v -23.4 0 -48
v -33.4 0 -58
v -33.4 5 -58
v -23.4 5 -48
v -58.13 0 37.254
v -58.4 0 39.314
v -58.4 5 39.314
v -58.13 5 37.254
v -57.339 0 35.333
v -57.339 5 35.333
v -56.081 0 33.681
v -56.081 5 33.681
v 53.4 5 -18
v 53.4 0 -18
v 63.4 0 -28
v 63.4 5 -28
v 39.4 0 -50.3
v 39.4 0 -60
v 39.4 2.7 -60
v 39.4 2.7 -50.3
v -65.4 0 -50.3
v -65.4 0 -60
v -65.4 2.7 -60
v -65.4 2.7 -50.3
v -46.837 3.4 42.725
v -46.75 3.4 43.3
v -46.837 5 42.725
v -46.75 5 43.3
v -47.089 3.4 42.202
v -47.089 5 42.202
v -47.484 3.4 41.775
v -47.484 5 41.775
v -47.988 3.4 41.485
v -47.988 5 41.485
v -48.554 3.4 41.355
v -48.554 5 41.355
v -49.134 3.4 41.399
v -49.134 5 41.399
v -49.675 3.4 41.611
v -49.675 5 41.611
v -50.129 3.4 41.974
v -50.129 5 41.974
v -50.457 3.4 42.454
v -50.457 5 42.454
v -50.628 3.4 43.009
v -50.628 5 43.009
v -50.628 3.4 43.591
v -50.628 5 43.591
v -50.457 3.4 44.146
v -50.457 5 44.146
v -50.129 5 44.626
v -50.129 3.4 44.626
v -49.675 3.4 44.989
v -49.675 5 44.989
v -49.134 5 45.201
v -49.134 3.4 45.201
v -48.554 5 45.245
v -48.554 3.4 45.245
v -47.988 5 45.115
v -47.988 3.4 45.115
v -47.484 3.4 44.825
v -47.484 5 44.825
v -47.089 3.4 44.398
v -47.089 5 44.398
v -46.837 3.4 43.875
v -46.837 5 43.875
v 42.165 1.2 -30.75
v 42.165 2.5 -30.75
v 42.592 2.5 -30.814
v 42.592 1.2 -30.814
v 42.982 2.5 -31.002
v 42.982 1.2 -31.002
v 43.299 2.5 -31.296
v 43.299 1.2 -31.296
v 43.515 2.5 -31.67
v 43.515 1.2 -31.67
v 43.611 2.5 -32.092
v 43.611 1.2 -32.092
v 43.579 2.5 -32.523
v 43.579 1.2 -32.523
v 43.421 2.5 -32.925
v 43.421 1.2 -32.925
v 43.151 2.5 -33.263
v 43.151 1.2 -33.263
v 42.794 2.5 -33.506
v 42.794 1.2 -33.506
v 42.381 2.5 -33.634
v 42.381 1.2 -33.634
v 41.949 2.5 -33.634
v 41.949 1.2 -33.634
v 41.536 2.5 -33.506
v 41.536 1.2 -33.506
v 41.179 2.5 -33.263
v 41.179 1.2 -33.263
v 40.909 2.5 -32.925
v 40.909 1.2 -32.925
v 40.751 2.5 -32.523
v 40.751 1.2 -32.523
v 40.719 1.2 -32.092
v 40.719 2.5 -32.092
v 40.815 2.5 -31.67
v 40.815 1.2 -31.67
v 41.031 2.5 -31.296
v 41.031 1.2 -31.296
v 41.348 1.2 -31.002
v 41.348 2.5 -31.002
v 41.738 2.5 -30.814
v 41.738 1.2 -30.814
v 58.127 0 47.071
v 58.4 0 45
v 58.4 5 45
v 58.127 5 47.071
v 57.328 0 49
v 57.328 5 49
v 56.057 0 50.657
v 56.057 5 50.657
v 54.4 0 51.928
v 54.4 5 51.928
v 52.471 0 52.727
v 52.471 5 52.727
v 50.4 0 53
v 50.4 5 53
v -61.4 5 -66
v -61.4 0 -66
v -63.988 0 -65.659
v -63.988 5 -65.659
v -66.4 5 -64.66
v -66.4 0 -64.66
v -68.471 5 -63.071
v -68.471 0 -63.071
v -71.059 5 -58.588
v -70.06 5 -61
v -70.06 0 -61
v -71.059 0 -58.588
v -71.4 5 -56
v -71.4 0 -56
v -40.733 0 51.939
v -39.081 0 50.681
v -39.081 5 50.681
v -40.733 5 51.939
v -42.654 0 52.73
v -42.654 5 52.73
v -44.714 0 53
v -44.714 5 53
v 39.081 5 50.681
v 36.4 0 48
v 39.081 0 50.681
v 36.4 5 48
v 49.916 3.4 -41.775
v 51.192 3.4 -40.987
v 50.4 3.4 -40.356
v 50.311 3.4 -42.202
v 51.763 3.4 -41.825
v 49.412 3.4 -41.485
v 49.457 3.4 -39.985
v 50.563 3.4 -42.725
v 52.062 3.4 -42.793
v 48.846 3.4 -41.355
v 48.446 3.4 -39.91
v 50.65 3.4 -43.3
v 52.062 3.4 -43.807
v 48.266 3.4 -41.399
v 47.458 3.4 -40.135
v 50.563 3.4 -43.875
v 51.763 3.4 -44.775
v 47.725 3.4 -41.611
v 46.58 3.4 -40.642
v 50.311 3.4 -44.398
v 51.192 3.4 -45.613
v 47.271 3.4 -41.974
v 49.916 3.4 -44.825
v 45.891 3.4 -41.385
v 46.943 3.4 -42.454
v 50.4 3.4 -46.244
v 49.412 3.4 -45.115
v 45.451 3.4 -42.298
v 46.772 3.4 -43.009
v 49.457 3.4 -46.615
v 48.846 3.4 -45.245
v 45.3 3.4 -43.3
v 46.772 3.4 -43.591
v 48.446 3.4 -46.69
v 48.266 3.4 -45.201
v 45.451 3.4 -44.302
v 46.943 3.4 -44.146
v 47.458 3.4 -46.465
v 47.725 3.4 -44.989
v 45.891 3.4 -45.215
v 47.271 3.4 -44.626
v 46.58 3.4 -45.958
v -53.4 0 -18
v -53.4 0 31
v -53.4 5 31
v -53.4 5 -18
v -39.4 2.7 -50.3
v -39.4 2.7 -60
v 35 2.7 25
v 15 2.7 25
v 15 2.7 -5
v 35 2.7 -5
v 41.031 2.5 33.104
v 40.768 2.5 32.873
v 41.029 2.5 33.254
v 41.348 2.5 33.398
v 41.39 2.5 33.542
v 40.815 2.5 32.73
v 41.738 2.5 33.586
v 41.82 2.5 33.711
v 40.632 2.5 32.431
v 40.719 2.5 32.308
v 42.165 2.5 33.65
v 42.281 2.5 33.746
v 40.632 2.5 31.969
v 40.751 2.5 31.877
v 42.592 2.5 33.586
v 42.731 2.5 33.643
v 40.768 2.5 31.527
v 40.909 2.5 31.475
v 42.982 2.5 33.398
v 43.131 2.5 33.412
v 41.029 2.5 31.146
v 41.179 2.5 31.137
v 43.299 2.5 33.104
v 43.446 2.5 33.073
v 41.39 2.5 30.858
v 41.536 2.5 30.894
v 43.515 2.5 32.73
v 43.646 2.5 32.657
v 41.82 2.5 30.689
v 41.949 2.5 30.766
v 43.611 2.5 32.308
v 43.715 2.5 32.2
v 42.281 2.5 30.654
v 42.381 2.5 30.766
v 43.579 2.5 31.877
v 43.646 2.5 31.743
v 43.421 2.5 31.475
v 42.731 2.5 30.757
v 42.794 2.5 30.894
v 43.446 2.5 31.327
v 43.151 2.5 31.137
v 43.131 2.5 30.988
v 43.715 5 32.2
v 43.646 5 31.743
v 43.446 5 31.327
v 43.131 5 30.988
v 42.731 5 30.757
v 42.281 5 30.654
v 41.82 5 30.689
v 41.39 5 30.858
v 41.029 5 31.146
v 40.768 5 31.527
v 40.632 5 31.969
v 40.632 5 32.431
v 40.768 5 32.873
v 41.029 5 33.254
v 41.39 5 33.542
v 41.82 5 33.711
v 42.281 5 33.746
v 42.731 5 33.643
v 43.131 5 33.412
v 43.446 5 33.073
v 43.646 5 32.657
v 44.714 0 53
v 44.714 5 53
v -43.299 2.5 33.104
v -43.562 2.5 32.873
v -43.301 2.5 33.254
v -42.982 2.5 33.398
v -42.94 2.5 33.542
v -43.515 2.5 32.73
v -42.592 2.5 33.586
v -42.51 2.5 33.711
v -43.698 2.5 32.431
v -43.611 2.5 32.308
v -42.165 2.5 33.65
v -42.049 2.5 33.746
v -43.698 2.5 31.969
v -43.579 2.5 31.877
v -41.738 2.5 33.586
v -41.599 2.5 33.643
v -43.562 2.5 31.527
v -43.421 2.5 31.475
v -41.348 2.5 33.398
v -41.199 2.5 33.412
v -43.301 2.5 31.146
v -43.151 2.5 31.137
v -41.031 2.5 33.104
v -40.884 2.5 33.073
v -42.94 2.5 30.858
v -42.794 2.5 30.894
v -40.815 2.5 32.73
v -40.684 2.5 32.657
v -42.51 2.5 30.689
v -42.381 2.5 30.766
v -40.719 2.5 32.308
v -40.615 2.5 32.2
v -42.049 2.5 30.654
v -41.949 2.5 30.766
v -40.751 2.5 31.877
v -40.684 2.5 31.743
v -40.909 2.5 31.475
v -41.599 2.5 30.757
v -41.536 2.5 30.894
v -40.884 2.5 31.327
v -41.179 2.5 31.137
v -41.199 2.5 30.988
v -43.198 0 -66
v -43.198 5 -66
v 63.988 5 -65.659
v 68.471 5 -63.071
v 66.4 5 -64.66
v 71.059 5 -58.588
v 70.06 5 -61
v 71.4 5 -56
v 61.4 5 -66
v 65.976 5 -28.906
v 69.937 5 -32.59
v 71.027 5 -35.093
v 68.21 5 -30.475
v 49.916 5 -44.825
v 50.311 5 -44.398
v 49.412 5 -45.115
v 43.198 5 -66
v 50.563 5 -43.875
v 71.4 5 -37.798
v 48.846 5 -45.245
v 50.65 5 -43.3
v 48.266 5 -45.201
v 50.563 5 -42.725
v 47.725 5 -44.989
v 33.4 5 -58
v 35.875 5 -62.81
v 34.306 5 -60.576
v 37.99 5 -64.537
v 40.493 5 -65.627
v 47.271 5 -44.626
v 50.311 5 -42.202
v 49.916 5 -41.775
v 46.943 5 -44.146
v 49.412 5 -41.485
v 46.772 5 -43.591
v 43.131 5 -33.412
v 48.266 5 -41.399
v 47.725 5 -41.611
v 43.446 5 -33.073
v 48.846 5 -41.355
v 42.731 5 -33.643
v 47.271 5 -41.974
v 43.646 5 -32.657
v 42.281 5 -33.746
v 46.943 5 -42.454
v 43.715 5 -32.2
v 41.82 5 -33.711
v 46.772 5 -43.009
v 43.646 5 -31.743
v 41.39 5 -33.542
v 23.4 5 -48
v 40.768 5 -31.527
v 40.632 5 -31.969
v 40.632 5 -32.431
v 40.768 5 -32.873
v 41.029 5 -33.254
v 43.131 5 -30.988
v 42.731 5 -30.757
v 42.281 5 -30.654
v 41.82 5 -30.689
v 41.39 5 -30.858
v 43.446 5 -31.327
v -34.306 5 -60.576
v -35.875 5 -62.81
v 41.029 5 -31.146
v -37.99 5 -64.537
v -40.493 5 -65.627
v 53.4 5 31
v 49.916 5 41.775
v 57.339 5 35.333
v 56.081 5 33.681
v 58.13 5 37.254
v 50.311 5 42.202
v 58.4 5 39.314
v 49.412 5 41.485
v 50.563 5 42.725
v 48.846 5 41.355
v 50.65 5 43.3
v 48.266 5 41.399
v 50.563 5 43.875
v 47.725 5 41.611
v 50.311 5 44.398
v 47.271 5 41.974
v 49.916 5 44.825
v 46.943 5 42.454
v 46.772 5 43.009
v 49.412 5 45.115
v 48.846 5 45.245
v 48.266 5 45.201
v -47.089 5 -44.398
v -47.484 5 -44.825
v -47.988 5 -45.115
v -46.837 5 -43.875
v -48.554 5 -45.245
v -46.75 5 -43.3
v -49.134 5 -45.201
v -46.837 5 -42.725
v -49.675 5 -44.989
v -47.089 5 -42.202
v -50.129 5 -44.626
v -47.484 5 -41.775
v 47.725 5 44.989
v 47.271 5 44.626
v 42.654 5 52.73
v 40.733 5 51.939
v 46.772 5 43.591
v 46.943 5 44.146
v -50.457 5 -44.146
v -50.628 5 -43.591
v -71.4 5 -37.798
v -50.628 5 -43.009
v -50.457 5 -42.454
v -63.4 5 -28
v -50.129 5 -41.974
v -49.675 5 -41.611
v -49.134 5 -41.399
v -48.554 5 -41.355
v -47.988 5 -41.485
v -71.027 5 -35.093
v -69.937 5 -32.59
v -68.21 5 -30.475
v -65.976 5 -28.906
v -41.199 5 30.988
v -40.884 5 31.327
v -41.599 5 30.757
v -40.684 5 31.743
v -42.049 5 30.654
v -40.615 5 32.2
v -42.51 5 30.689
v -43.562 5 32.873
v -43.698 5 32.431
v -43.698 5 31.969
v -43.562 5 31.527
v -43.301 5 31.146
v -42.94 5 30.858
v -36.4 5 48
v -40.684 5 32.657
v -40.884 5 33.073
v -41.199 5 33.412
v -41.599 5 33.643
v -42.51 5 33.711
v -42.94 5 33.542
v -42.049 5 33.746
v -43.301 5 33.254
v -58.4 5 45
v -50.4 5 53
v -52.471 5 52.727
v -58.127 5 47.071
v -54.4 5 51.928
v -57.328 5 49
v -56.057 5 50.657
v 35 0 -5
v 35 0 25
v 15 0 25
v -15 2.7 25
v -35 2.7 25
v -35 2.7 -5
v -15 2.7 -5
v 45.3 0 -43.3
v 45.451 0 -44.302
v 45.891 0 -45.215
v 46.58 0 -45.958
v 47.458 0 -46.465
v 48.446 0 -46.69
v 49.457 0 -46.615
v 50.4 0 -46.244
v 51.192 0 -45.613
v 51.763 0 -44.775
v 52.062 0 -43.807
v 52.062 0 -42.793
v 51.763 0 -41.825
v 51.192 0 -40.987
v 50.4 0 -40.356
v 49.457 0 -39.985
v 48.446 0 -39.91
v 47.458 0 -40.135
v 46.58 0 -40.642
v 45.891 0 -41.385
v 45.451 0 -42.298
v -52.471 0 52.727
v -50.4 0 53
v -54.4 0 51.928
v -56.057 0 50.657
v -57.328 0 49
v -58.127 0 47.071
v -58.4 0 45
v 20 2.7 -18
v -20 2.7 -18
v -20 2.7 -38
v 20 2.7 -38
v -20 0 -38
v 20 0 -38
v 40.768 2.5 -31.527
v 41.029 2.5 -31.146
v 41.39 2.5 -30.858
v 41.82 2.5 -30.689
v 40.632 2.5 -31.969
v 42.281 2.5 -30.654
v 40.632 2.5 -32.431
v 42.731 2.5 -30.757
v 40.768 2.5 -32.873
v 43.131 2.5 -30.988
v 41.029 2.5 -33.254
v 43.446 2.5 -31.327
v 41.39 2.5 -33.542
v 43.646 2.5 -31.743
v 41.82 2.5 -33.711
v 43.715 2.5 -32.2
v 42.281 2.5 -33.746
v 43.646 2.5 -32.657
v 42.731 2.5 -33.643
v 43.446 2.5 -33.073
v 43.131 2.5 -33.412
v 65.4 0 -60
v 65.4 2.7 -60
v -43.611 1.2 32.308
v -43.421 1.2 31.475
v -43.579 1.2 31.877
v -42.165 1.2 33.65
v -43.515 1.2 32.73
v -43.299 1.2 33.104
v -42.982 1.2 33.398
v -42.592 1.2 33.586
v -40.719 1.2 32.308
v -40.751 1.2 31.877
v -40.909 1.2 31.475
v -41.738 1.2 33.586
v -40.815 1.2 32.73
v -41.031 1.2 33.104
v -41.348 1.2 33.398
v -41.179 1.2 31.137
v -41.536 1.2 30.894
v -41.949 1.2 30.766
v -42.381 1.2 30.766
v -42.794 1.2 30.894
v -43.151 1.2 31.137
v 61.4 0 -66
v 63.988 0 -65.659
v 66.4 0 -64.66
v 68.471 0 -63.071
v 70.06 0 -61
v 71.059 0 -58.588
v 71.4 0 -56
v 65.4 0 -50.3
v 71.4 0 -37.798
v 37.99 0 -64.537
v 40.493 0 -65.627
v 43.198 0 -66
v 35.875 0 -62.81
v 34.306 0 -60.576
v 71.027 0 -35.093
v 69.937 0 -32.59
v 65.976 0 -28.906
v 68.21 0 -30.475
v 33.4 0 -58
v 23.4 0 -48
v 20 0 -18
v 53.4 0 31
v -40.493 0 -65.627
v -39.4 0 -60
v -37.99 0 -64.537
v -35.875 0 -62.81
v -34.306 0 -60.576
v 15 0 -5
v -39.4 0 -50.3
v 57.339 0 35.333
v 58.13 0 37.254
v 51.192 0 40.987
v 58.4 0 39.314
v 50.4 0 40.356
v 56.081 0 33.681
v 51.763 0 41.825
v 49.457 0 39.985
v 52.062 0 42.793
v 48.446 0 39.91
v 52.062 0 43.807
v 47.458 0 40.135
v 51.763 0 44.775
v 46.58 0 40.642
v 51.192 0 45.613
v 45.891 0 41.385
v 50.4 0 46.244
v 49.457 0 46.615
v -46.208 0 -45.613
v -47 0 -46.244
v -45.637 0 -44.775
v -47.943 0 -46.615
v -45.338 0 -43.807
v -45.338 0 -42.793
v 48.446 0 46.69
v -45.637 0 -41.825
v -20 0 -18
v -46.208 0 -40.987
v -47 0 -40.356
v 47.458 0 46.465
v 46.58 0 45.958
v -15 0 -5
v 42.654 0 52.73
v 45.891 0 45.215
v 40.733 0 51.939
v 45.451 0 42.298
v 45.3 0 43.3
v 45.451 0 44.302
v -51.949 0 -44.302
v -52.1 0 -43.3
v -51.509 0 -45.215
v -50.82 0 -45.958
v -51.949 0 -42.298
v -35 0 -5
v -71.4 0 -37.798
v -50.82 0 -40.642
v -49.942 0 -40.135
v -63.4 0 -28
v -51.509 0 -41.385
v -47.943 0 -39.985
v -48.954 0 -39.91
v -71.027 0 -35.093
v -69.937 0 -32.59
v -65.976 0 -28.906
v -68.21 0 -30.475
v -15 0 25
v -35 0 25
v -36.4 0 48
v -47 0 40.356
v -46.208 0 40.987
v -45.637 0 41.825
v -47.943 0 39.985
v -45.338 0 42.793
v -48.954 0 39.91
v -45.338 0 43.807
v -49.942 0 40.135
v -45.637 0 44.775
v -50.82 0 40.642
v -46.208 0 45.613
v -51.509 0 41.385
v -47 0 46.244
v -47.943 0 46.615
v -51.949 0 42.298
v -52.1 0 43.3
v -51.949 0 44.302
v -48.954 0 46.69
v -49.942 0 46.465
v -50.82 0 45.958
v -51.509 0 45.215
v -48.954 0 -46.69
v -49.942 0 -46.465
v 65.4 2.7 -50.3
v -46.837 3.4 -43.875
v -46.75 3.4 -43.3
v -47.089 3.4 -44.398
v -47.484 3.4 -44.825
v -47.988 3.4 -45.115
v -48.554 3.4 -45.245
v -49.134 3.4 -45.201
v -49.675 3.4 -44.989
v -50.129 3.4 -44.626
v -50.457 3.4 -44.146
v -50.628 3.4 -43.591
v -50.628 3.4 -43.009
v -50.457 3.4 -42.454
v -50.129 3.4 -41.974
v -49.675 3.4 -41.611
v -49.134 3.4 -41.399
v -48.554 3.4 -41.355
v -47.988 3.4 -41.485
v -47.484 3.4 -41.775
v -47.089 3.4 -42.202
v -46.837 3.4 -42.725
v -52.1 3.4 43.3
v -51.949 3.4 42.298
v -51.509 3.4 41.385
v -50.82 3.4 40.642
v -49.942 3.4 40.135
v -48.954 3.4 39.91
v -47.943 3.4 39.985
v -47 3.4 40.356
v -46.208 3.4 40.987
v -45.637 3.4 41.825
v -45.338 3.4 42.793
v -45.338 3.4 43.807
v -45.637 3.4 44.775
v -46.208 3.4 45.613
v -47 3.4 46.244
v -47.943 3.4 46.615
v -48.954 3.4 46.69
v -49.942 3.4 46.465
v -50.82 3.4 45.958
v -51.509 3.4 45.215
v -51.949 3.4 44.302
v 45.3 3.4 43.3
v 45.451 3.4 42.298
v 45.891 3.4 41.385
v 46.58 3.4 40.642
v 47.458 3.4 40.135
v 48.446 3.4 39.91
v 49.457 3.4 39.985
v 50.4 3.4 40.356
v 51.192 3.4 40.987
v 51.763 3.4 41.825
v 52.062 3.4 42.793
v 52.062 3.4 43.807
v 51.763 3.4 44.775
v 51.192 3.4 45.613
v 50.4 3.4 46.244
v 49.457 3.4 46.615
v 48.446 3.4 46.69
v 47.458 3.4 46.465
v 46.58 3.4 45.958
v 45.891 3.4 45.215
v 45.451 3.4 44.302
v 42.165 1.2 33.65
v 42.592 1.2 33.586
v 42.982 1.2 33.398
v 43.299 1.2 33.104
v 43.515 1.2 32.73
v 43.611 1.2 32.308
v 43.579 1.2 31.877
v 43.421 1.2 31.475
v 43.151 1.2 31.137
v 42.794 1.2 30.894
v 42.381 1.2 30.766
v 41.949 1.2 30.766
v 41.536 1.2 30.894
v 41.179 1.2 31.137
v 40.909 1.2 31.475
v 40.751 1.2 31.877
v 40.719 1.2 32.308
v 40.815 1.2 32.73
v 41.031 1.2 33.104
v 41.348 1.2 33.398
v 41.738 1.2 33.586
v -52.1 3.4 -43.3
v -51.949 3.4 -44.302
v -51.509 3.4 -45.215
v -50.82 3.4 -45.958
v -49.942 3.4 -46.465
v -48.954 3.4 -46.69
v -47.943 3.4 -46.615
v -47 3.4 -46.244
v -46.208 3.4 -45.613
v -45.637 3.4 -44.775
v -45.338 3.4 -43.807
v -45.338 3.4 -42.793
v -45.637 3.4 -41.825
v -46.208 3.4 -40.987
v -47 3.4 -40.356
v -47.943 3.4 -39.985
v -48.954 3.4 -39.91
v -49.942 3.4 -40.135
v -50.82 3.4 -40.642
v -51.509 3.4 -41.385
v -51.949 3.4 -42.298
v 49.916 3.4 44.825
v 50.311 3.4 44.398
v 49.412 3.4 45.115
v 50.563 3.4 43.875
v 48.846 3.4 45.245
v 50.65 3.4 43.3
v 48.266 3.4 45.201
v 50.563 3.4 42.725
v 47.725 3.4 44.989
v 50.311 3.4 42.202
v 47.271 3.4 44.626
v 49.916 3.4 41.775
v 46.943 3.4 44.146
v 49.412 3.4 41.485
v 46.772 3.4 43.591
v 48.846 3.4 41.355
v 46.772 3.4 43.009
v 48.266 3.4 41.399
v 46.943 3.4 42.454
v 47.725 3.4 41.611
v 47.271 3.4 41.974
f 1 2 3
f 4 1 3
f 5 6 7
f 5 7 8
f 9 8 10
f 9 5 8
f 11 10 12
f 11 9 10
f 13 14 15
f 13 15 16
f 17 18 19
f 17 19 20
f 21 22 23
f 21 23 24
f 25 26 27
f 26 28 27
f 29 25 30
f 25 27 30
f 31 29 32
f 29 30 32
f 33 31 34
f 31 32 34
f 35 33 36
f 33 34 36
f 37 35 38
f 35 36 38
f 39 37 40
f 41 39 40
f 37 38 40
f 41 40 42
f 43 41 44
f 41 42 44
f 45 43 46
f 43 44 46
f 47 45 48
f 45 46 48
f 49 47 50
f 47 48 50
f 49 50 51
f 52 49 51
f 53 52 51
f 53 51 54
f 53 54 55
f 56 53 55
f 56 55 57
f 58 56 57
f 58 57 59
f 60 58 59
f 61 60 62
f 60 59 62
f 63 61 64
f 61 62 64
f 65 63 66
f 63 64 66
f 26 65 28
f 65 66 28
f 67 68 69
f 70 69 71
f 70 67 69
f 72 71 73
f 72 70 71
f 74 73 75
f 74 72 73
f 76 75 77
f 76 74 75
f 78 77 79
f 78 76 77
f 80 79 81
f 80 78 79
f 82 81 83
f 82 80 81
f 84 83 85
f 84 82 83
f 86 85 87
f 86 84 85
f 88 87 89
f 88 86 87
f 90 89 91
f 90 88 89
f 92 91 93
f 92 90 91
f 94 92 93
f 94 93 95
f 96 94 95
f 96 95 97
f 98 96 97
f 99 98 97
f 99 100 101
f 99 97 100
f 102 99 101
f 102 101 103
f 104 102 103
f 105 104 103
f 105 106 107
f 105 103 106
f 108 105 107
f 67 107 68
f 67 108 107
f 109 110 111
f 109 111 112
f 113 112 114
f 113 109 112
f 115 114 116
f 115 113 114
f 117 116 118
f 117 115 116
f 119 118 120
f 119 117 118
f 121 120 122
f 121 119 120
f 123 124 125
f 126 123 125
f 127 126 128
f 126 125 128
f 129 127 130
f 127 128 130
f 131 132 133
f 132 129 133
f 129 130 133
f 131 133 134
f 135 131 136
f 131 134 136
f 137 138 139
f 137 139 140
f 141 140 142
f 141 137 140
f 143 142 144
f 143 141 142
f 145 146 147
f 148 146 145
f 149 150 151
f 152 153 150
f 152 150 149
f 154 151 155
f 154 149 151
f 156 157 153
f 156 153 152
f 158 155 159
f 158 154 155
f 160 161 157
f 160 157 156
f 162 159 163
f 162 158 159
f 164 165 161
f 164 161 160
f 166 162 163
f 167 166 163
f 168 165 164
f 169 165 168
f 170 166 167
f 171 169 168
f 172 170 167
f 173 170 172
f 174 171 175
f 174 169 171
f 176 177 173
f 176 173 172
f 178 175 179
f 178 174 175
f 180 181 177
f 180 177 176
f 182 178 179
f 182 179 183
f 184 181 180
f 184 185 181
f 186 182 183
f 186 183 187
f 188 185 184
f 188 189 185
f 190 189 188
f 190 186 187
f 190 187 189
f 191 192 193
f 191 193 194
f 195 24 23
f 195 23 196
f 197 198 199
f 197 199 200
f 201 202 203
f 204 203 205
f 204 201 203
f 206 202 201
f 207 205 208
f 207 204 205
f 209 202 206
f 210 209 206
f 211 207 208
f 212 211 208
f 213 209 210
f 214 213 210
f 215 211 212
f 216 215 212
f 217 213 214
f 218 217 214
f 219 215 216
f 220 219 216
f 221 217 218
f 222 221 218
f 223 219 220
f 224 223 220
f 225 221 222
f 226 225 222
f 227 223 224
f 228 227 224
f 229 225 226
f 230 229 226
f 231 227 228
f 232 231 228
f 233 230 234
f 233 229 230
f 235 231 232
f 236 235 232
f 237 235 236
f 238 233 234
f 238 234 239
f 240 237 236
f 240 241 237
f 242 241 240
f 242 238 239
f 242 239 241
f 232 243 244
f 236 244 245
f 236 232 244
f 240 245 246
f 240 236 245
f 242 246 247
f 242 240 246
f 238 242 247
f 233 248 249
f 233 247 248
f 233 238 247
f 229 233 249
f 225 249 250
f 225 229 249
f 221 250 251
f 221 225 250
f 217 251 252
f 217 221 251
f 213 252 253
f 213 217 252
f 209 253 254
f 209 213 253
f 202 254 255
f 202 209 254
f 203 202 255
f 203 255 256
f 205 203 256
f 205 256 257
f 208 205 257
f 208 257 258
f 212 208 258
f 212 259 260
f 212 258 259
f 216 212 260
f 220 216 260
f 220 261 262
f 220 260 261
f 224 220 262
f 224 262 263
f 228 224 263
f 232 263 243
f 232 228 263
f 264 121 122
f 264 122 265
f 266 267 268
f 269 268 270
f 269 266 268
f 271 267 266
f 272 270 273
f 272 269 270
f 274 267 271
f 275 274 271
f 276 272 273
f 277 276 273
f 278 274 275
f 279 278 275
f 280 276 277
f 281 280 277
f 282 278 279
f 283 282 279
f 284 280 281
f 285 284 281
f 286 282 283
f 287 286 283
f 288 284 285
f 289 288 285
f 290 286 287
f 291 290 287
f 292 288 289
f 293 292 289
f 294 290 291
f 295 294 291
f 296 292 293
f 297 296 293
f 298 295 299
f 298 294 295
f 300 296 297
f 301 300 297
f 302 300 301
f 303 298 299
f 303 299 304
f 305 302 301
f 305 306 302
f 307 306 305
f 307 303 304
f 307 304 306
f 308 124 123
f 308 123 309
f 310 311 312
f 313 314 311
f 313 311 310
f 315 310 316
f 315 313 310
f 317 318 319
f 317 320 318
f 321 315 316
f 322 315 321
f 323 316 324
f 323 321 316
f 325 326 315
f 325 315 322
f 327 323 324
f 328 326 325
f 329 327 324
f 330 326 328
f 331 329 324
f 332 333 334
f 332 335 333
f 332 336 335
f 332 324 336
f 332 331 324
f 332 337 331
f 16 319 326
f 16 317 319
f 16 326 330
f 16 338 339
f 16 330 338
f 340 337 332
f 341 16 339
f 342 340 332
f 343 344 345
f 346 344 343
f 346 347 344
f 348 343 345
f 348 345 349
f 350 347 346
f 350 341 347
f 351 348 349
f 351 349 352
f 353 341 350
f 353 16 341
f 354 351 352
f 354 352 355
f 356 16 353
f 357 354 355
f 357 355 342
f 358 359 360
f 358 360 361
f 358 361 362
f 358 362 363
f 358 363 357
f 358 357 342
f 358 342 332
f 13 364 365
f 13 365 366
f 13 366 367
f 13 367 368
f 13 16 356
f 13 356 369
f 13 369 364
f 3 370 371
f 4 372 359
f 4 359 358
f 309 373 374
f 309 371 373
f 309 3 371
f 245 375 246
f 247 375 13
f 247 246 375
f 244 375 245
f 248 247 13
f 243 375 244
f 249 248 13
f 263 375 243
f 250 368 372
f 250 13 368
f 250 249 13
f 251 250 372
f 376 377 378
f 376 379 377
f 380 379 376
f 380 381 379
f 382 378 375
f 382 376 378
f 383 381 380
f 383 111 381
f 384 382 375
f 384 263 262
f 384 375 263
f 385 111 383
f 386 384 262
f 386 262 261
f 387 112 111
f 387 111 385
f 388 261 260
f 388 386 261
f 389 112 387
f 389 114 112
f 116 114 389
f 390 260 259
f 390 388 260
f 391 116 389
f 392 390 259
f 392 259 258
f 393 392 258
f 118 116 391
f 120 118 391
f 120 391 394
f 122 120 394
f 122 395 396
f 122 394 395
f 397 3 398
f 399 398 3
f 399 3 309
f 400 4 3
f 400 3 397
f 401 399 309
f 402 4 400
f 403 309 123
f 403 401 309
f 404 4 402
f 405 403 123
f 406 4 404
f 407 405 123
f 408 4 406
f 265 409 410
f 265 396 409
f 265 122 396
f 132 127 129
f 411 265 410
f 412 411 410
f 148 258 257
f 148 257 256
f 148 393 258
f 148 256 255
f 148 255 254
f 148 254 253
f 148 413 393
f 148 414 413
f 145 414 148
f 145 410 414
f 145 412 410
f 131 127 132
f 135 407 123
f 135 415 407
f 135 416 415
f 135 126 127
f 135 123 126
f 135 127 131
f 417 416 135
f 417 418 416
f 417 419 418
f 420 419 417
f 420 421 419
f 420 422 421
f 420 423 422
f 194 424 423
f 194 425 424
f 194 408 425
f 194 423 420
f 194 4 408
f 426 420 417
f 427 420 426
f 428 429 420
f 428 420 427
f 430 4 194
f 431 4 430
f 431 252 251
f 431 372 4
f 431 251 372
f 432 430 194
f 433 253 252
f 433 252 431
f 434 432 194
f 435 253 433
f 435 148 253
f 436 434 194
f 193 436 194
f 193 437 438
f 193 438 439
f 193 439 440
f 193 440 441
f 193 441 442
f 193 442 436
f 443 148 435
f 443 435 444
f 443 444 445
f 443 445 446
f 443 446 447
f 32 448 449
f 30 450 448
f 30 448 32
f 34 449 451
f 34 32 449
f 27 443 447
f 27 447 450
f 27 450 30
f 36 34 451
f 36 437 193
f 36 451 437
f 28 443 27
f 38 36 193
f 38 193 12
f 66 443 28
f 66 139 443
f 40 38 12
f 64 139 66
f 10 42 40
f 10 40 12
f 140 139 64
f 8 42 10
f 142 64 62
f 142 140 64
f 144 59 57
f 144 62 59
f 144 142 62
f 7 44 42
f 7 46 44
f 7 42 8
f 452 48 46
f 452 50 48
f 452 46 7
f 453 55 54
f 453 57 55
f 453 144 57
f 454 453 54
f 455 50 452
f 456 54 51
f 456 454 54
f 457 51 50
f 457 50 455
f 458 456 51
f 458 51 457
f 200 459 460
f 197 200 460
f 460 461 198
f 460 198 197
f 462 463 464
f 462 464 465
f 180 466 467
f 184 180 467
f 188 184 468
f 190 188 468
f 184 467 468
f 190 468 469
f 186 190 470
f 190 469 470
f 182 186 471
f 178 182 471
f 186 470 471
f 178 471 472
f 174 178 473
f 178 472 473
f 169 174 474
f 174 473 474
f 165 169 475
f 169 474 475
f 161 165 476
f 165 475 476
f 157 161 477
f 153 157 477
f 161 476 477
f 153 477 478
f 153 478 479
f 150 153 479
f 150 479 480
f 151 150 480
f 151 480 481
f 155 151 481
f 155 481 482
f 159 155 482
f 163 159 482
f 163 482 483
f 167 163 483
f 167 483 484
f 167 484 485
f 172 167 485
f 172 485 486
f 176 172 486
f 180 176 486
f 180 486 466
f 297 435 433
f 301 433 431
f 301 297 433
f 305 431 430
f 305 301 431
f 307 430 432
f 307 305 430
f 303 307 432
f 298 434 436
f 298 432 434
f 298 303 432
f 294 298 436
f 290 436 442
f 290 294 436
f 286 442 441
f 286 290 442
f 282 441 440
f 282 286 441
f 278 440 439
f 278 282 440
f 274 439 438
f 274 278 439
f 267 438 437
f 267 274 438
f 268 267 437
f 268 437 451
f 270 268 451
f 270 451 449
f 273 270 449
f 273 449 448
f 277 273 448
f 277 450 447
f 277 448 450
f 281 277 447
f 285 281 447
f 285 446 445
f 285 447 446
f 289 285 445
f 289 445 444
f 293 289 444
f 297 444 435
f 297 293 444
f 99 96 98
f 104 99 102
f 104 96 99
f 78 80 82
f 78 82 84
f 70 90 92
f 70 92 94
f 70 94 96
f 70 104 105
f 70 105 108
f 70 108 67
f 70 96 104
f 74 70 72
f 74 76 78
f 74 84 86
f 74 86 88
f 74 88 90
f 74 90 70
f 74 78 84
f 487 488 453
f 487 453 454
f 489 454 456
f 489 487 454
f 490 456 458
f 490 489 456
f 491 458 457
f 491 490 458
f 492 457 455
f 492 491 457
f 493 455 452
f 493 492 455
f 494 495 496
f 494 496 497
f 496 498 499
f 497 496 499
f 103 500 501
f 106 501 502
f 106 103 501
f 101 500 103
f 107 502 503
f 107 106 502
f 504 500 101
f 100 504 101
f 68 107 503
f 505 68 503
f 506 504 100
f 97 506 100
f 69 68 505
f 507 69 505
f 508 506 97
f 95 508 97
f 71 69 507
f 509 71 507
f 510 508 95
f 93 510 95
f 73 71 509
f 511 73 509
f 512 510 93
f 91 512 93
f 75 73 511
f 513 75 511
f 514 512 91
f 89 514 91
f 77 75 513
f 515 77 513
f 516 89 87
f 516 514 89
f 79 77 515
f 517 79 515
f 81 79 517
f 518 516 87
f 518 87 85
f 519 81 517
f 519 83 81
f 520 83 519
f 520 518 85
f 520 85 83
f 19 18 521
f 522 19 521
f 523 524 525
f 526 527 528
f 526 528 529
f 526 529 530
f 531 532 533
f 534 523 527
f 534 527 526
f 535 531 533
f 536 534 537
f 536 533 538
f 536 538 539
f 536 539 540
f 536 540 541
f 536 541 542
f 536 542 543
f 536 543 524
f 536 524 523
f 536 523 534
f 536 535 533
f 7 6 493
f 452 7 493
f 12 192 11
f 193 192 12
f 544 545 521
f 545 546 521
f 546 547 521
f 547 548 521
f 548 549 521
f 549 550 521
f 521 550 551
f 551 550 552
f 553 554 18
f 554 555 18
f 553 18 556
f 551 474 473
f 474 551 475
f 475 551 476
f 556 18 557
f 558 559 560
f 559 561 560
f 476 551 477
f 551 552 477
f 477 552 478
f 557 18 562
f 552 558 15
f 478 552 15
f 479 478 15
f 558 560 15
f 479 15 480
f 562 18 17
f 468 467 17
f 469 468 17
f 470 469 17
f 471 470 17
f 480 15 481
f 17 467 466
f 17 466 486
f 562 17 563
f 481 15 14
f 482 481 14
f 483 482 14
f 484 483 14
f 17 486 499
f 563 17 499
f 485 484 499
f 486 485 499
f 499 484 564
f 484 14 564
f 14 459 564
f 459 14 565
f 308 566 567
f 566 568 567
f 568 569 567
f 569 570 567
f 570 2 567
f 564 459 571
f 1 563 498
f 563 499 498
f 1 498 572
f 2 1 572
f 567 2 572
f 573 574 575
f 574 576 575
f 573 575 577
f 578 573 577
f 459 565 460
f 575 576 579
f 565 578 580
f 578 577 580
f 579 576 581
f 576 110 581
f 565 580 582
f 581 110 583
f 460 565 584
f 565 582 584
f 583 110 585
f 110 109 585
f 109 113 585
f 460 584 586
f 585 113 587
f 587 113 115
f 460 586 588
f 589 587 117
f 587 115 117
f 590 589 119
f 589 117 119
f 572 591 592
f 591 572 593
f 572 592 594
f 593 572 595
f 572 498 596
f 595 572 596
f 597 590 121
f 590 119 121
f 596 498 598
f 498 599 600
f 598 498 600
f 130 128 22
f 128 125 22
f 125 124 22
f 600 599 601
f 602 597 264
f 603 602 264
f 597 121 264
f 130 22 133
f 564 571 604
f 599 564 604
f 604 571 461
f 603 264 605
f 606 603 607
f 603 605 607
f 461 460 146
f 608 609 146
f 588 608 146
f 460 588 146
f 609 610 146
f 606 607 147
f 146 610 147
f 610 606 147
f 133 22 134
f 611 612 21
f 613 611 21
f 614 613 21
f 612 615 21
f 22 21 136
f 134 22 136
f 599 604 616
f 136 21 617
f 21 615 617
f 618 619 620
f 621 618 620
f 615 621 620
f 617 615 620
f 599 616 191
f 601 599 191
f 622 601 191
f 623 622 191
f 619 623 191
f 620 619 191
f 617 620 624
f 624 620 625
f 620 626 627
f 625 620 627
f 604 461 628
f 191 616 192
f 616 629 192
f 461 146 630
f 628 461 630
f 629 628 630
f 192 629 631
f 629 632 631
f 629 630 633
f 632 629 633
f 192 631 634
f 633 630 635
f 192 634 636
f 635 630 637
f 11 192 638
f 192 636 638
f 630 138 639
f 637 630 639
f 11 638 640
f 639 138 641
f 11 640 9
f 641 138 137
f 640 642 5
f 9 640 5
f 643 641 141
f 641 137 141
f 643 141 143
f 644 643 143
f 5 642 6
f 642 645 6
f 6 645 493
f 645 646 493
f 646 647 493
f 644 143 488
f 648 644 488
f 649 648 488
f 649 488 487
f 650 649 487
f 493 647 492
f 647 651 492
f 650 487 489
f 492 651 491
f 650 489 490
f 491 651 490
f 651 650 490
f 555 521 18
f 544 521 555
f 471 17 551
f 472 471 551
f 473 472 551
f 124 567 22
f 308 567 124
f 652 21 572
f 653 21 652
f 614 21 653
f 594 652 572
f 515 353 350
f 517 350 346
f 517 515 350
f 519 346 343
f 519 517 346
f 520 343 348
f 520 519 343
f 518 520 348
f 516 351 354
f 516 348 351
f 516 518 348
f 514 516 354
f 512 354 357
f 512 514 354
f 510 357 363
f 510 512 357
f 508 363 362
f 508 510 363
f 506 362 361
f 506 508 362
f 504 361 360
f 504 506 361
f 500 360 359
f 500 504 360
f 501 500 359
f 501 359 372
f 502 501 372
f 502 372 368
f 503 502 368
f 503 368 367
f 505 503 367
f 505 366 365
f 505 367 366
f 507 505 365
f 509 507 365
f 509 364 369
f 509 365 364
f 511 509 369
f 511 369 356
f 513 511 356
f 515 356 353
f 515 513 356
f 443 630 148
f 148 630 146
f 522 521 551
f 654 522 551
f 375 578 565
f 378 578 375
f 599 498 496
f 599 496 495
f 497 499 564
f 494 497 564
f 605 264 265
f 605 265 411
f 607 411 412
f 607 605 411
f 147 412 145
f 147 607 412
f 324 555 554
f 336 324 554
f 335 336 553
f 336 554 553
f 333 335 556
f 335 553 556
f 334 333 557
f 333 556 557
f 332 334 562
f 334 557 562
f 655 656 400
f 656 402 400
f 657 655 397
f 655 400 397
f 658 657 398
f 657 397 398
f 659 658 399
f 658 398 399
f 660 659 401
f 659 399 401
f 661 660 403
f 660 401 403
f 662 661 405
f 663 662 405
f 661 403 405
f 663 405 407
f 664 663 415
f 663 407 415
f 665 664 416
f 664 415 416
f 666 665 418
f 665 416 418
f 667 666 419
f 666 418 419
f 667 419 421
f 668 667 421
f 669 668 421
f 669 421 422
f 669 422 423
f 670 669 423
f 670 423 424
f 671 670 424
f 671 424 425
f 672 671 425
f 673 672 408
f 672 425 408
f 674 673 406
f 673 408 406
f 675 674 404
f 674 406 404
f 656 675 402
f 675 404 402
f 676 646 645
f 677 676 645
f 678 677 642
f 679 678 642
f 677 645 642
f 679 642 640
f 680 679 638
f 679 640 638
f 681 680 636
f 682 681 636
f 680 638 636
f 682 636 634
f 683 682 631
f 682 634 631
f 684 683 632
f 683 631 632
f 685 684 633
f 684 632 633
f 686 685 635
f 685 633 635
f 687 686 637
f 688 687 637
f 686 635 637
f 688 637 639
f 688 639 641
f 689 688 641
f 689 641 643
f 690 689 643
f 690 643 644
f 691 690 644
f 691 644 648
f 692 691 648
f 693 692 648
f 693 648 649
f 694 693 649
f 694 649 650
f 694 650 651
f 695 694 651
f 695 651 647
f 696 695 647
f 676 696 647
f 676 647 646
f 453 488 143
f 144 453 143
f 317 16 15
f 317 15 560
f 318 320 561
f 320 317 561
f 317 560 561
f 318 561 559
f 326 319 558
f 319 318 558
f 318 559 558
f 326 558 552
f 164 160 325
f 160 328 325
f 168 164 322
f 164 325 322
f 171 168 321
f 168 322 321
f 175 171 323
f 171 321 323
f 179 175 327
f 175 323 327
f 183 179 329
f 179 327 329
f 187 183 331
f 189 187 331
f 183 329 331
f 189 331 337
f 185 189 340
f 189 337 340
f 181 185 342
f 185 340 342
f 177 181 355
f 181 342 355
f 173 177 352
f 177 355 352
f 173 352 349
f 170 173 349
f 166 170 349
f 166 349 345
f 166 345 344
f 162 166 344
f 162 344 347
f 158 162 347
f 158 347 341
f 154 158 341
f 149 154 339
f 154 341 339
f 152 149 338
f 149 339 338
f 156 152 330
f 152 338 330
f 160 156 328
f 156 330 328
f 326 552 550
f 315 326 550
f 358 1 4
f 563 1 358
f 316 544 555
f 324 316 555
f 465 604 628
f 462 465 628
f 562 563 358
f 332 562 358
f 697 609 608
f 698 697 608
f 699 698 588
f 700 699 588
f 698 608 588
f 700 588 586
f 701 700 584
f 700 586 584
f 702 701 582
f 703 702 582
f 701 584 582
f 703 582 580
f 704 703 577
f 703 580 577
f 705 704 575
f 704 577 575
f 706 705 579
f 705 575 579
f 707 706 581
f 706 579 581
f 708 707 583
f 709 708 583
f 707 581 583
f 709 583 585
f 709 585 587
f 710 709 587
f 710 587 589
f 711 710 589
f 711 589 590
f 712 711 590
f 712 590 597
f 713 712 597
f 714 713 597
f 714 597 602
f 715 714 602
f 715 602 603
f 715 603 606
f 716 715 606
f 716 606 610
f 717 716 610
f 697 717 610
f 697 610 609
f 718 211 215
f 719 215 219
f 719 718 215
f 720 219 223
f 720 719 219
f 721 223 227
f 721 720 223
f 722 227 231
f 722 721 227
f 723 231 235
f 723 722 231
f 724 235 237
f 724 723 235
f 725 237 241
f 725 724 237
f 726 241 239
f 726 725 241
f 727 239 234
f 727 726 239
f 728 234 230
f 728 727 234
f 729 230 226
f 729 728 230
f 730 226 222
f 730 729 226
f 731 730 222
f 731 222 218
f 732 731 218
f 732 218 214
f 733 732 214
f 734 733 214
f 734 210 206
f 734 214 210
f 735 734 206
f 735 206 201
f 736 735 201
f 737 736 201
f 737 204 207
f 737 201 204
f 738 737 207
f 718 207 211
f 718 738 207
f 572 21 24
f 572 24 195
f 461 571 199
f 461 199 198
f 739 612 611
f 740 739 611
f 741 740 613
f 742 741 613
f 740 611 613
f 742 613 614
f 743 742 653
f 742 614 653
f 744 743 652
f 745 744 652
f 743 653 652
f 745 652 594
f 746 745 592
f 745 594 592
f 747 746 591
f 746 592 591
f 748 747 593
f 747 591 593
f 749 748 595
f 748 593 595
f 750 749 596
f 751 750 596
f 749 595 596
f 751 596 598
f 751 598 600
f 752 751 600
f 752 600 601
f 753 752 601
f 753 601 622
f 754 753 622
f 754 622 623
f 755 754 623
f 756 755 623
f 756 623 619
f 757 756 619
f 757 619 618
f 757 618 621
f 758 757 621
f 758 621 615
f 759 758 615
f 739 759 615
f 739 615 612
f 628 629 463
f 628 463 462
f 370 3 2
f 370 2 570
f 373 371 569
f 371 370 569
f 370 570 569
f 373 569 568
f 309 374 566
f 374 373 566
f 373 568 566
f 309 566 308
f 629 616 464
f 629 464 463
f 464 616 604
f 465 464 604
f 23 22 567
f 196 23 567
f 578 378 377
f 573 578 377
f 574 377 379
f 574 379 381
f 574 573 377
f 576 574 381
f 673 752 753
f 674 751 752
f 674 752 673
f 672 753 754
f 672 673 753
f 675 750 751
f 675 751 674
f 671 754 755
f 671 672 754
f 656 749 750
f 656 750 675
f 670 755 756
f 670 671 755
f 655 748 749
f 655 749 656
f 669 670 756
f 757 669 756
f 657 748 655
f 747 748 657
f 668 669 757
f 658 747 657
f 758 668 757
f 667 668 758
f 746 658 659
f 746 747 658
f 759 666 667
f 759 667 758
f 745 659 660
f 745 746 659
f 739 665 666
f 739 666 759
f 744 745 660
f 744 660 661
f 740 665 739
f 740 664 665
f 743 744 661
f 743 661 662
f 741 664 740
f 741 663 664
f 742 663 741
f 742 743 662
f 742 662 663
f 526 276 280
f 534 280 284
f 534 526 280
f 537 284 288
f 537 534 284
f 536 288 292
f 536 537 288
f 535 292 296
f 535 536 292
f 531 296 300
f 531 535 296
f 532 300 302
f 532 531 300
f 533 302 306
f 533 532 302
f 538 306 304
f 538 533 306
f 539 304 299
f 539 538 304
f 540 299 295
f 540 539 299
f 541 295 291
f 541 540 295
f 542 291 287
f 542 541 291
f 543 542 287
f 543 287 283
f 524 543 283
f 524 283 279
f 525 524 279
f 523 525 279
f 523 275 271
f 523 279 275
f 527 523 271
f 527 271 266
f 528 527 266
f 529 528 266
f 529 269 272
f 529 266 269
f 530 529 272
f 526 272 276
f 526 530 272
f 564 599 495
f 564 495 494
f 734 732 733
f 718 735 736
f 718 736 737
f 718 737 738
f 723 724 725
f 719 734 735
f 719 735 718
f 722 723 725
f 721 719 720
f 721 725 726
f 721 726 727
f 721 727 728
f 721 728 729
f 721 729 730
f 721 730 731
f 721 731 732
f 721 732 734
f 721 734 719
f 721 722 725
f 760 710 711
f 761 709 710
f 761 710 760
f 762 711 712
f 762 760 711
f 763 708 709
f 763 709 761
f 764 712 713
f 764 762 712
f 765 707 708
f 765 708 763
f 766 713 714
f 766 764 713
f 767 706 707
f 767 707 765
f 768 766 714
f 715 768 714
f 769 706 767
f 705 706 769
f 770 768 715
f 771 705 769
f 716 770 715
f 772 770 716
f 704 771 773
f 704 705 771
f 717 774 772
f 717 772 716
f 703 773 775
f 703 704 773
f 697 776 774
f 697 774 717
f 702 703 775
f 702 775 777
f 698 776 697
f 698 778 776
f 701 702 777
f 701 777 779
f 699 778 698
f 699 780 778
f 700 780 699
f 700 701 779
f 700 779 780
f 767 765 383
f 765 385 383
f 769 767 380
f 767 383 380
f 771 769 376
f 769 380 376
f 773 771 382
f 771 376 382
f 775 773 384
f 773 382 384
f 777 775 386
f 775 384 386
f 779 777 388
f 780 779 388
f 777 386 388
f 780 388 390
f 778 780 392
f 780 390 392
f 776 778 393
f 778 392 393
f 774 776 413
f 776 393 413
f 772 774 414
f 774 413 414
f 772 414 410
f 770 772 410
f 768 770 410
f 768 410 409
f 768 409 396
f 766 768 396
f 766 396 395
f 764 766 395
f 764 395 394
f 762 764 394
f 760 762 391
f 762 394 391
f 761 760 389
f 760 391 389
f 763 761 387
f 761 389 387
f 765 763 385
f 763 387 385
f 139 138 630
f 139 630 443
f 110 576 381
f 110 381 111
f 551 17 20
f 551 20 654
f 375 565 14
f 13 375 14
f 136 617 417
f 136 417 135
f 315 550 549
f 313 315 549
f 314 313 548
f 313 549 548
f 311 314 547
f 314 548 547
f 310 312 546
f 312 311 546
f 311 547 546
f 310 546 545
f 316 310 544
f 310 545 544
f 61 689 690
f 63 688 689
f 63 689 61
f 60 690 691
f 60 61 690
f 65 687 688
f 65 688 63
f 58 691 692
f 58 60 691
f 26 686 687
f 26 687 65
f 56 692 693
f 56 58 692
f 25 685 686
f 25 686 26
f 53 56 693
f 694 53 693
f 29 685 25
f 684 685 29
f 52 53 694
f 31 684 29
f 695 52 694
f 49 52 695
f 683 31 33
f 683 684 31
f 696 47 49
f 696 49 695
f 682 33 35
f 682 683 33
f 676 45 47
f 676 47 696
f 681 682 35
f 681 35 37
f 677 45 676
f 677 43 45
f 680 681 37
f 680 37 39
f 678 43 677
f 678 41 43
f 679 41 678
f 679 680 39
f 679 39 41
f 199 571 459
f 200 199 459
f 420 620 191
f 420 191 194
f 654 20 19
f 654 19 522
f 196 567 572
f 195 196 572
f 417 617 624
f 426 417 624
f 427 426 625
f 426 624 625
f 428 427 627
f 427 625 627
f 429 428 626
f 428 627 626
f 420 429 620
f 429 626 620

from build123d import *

# Parameters (mm, degrees)
SKETCH1_W                                       = 106.8
SKETCH1_H                                       = 96
SKETCH1_W_2                                     = 100.8
SKETCH1_H_2                                     = 90
BASE_DEPTH                                      = 5
BOSS_EXTRUDE1_DEPTH                             = 5
CHAMFER1_SIZE                                   = 10
FILLET1_R                                       = 10
CHAMFER4_SIZE                                   = 5
FILLET2_START                                   = -1
FILLET2_DEPTH                                   = 7
CBORE_FOR_M3_SOCKET_HEAD_CAP_SCREW1_D           = 3.9
CBORE_FOR_M3_SOCKET_HEAD_CAP_SCREW1_CBORE_D     = 6.8
CBORE_FOR_M3_SOCKET_HEAD_CAP_SCREW1_CBORE_DEPTH = 3.4
SKETCH8_W                                       = 20
SKETCH8_H                                       = 30
SKETCH8_W_2                                     = 40
SKETCH8_H_2                                     = 20
SKETCH8_W_3                                     = 26
SKETCH8_H_3                                     = 9.7
CUT_EXTRUDE1_DEPTH                              = 2.7
CUT_EXTRUDE2_START                              = 2.5
CUT_EXTRUDE2_OUTLINE_R                          = 1.55
CUT_EXTRUDE2_OUTLINE_R_2                        = 1.45
CUT_EXTRUDE2_DEPTH                              = 3.5
CUT_EXTRUDE3_START                              = -3.8
SKETCH9_3_R                                     = 1.45
CUT_EXTRUDE3_DEPTH                              = 3.8


with BuildPart() as part:
    # Sketch1 → Base (new body)
    # profile 1 of 2: a face of its own
    with BuildSketch(Plane(origin=(0, 0, 0), x_dir=(1, 0, 0), z_dir=(0, 1, 0))):
        Rectangle(SKETCH1_W, SKETCH1_H)
        Rectangle(SKETCH1_W_2, SKETCH1_H_2, mode=Mode.SUBTRACT)
    # profile 2 of 2: a face of its own
    with BuildSketch(Plane(origin=(0, 0, 0), x_dir=(1, 0, 0), z_dir=(0, 1, 0))):
        Rectangle(SKETCH1_W_2, SKETCH1_H_2)
    extrude(amount=BASE_DEPTH)

    # Sketch7 → Boss-Extrude1 (add)
    with BuildSketch(Plane.XZ):
        Polygon((53.4, -28), (71.4, -28), (71.4, -66), (33.4, -66), (33.4, -48), (53.4, -48), align=None)
        Polygon((-33.4, -48), (-53.4, -48), (-53.4, -28), (-71.4, -28), (-71.4, -66), (-33.4, -66), align=None)
        Polygon((-53.4, 36), (-58.4, 36), (-58.4, 53), (-41.4, 53), (-41.4, 48), (-53.4, 48), align=None)
        Polygon((41.4, 48), (53.4, 48), (53.4, 36), (58.4, 36), (58.4, 53), (41.4, 53), align=None)
    extrude(amount=-BOSS_EXTRUDE1_DEPTH)

    # Chamfer1
    chamfer1_edges = [part.edges().sort_by_distance(p)[0] for p in [
        (33.4, 2.5, -48),
        (53.4, 2.5, -28),
        (-53.4, 2.5, -28),
        (-33.4, 2.5, -48),
    ]]
    chamfer(chamfer1_edges, length=CHAMFER1_SIZE)

    # Fillet1
    # the kernel refuses this fillet: 10 mm, written as the material it takes off along each edge
    with BuildSketch(Plane(origin=(-71.4, -24.494897428, -28), x_dir=(1, 0, 0), z_dir=(0, 1, 0)), Plane(origin=(33.4, -24.494897428, -66), x_dir=(0, 0, 1), z_dir=(0, 1, 0))) as fillet1_piece_1:
        with BuildLine():
            CenterArc((10, 9.797958971), FILLET1_R, 180, 78.463040967)
            Line((0, 9.797958971), (-0.2, 9.797958971))
            Line((-0.2, 9.797958971), (-0.2, 0))
            Line((-0.2, 0), (0, -0.2))
            ThreePointArc((0, -0.2), (4, -0.2), (7.96, -0.195959179))
            Line((7.96, -0.195959179), (8, 0))
        make_face()
    extrude(amount=53.989794856, mode=Mode.SUBTRACT)
    with BuildSketch(Plane(origin=(-71.4, -25, -66), x_dir=(0, 0, 1), z_dir=(0, 1, 0)), Plane(origin=(71.4, -25, -66), x_dir=(-1, 0, 0), z_dir=(0, 1, 0))) as fillet1_piece_2:
        with BuildLine():
            CenterArc((FILLET1_R, FILLET1_R), FILLET1_R, 180, 90)
            Line((0, FILLET1_R), (-FILLET1_R * 0.02, FILLET1_R))
            Line((-FILLET1_R * 0.02, FILLET1_R), (-FILLET1_R * 0.02, -FILLET1_R * 0.02))
            Line((-FILLET1_R * 0.02, -FILLET1_R * 0.02), (FILLET1_R, -FILLET1_R * 0.02))
            Line((FILLET1_R, -FILLET1_R * 0.02), (FILLET1_R, 0))
        make_face()
    extrude(amount=55, mode=Mode.SUBTRACT)
    with BuildSketch(Plane(origin=(-33.4, -24.494897428, -66), x_dir=(-1, 0, 0), z_dir=(0, 1, 0)), Plane(origin=(71.4, -24.494897428, -28), x_dir=(0, 0, -1), z_dir=(0, 1, 0))) as fillet1_piece_3:
        with BuildLine():
            CenterArc((9.797958971, 10), FILLET1_R, 191.536959033, 78.463040967)
            Line((0, 8), (-0.195959179, 7.96))
            ThreePointArc((-0.195959179, 7.96), (-0.2, 4), (-0.2, 0))
            Line((-0.2, 0), (0, -0.2))
            Line((0, -0.2), (9.797958971, -0.2))
            Line((9.797958971, -0.2), (9.797958971, 0))
        make_face()
    extrude(amount=53.989794856, mode=Mode.SUBTRACT)

    # Chamfer4
    chamfer4_edges = [part.edges().sort_by_distance(p)[0] for p in [
        (41.4, 2.5, 48),
        (53.4, 2.5, 36),
        (-41.4, 2.5, 48),
        (-53.4, 2.5, 36),
    ]]
    chamfer(chamfer4_edges, length=CHAMFER4_SIZE - 0.0001)  # a hair under: the kernel refuses the full size

    # Fillet2: read off the stored shape, not the designer's step
    # Fillet2 outline → Fillet2 (cut)
    with BuildSketch(Plane(origin=(0, 0, 0), x_dir=(1, 0, 0), z_dir=(0, 1, 0)).offset(FILLET2_START)):
        with BuildLine():
            ThreePointArc((56.056854249, -33.656854249), (57.79103626, -36.25224104), (58.4, -39.313708499))
            Line((58.4, -39.313708499), (58.4, -36))
            Line((58.4, -36), (56.056854249, -33.656854249))
        make_face()
        with BuildLine():
            ThreePointArc((58.4, -45), (56.056854249, -50.656854249), (50.4, -53))
            Line((50.4, -53), (58.4, -53))
            Line((58.4, -53), (58.4, -45))
        make_face()
        with BuildLine():
            ThreePointArc((44.713708499, -53), (41.65224104, -52.39103626), (39.056854249, -50.656854249))
            Line((39.056854249, -50.656854249), (41.4, -53))
            Line((41.4, -53), (44.713708499, -53))
        make_face()
        with BuildLine():
            Line((-58.4, -36), (-58.4, -39.313708499))
            ThreePointArc((-58.4, -39.313708499), (-57.79103626, -36.25224104), (-56.056854249, -33.656854249))
            Line((-56.056854249, -33.656854249), (-58.4, -36))
        make_face()
        with BuildLine():
            ThreePointArc((-39.056854249, -50.656854249), (-41.65224104, -52.39103626), (-44.713708499, -53))
            Line((-44.713708499, -53), (-41.4, -53))
            Line((-41.4, -53), (-39.056854249, -50.656854249))
        make_face()
        with BuildLine():
            ThreePointArc((-50.4, -53), (-56.056854249, -50.656854249), (-58.4, -45))
            Line((-58.4, -45), (-58.4, -53))
            Line((-58.4, -53), (-50.4, -53))
        make_face()
    extrude(amount=FILLET2_DEPTH, mode=Mode.SUBTRACT)

    # CBORE for M3 Socket Head Cap Screw1 (through all)
    with Locations(Plane(origin=(0, 0, 0), x_dir=(-1, 0, 0), z_dir=(0, -1, 0))):
        with Locations((-48.7, 43.3), (-48.7, -43.3), (48.7, 43.3), (48.7, -43.3)):
            CounterBoreHole(CBORE_FOR_M3_SOCKET_HEAD_CAP_SCREW1_D / 2, CBORE_FOR_M3_SOCKET_HEAD_CAP_SCREW1_CBORE_D / 2, CBORE_FOR_M3_SOCKET_HEAD_CAP_SCREW1_CBORE_DEPTH)

    # Sketch8 → Cut-Extrude1 (cut)
    with BuildSketch(Plane.XZ):
        with Locations((-25, 10)):
            Rectangle(SKETCH8_W, SKETCH8_H)
        with Locations((25, 10)):
            Rectangle(SKETCH8_W, SKETCH8_H)
        with Locations((0, -28)):
            Rectangle(SKETCH8_W_2, SKETCH8_H_2)
        with Locations((-52.4, -55.15)):
            Rectangle(SKETCH8_W_3, SKETCH8_H_3)
        with Locations((52.4, -55.15)):
            Rectangle(SKETCH8_W_3, SKETCH8_H_3)
    extrude(amount=-CUT_EXTRUDE1_DEPTH, mode=Mode.SUBTRACT)

    # Cut-Extrude2: read off the stored shape, not the designer's step
    # Cut-Extrude2 outline → Cut-Extrude2 (cut)
    # profile 1 of 3: a face of its own
    with BuildSketch(Plane(origin=(0, 0, 0), x_dir=(1, 0, 0), z_dir=(0, 1, 0)).offset(CUT_EXTRUDE2_START)):
        with Locations((42.165, 32.2)):
            Circle(CUT_EXTRUDE2_OUTLINE_R)
        with Locations((42.165, 32.2)):
            Circle(CUT_EXTRUDE2_OUTLINE_R_2, mode=Mode.SUBTRACT)
    # profile 2 of 3: a face of its own
    with BuildSketch(Plane(origin=(0, 0, 0), x_dir=(1, 0, 0), z_dir=(0, 1, 0)).offset(CUT_EXTRUDE2_START)):
        with Locations((42.165, -32.2)):
            Circle(CUT_EXTRUDE2_OUTLINE_R)
        with Locations((42.165, -32.2)):
            Circle(CUT_EXTRUDE2_OUTLINE_R_2, mode=Mode.SUBTRACT)
    # profile 3 of 3: a face of its own
    with BuildSketch(Plane(origin=(0, 0, 0), x_dir=(1, 0, 0), z_dir=(0, 1, 0)).offset(CUT_EXTRUDE2_START)):
        with Locations((-42.165, -32.2)):
            Circle(CUT_EXTRUDE2_OUTLINE_R)
        with Locations((-42.165, -32.2)):
            Circle(CUT_EXTRUDE2_OUTLINE_R_2, mode=Mode.SUBTRACT)
    extrude(amount=CUT_EXTRUDE2_DEPTH, mode=Mode.SUBTRACT)

    # Sketch9<3> → Cut-Extrude3 (cut)
    with BuildSketch(Plane(origin=(0, 5, 0), x_dir=(1, 0, 0), z_dir=(0, 1, 0)).offset(CUT_EXTRUDE3_START)):
        with Locations(Location((-42.165, -32.2, 0), (0, 0, 270))):
            Circle(SKETCH9_3_R)
        with Locations(Location((42.165, -32.2, 0), (0, 0, 270))):
            Circle(SKETCH9_3_R)
        with Locations(Location((42.165, 32.2, 0), (0, 0, 270))):
            Circle(SKETCH9_3_R)
    extrude(amount=CUT_EXTRUDE3_DEPTH, mode=Mode.SUBTRACT)


solid = part.part
